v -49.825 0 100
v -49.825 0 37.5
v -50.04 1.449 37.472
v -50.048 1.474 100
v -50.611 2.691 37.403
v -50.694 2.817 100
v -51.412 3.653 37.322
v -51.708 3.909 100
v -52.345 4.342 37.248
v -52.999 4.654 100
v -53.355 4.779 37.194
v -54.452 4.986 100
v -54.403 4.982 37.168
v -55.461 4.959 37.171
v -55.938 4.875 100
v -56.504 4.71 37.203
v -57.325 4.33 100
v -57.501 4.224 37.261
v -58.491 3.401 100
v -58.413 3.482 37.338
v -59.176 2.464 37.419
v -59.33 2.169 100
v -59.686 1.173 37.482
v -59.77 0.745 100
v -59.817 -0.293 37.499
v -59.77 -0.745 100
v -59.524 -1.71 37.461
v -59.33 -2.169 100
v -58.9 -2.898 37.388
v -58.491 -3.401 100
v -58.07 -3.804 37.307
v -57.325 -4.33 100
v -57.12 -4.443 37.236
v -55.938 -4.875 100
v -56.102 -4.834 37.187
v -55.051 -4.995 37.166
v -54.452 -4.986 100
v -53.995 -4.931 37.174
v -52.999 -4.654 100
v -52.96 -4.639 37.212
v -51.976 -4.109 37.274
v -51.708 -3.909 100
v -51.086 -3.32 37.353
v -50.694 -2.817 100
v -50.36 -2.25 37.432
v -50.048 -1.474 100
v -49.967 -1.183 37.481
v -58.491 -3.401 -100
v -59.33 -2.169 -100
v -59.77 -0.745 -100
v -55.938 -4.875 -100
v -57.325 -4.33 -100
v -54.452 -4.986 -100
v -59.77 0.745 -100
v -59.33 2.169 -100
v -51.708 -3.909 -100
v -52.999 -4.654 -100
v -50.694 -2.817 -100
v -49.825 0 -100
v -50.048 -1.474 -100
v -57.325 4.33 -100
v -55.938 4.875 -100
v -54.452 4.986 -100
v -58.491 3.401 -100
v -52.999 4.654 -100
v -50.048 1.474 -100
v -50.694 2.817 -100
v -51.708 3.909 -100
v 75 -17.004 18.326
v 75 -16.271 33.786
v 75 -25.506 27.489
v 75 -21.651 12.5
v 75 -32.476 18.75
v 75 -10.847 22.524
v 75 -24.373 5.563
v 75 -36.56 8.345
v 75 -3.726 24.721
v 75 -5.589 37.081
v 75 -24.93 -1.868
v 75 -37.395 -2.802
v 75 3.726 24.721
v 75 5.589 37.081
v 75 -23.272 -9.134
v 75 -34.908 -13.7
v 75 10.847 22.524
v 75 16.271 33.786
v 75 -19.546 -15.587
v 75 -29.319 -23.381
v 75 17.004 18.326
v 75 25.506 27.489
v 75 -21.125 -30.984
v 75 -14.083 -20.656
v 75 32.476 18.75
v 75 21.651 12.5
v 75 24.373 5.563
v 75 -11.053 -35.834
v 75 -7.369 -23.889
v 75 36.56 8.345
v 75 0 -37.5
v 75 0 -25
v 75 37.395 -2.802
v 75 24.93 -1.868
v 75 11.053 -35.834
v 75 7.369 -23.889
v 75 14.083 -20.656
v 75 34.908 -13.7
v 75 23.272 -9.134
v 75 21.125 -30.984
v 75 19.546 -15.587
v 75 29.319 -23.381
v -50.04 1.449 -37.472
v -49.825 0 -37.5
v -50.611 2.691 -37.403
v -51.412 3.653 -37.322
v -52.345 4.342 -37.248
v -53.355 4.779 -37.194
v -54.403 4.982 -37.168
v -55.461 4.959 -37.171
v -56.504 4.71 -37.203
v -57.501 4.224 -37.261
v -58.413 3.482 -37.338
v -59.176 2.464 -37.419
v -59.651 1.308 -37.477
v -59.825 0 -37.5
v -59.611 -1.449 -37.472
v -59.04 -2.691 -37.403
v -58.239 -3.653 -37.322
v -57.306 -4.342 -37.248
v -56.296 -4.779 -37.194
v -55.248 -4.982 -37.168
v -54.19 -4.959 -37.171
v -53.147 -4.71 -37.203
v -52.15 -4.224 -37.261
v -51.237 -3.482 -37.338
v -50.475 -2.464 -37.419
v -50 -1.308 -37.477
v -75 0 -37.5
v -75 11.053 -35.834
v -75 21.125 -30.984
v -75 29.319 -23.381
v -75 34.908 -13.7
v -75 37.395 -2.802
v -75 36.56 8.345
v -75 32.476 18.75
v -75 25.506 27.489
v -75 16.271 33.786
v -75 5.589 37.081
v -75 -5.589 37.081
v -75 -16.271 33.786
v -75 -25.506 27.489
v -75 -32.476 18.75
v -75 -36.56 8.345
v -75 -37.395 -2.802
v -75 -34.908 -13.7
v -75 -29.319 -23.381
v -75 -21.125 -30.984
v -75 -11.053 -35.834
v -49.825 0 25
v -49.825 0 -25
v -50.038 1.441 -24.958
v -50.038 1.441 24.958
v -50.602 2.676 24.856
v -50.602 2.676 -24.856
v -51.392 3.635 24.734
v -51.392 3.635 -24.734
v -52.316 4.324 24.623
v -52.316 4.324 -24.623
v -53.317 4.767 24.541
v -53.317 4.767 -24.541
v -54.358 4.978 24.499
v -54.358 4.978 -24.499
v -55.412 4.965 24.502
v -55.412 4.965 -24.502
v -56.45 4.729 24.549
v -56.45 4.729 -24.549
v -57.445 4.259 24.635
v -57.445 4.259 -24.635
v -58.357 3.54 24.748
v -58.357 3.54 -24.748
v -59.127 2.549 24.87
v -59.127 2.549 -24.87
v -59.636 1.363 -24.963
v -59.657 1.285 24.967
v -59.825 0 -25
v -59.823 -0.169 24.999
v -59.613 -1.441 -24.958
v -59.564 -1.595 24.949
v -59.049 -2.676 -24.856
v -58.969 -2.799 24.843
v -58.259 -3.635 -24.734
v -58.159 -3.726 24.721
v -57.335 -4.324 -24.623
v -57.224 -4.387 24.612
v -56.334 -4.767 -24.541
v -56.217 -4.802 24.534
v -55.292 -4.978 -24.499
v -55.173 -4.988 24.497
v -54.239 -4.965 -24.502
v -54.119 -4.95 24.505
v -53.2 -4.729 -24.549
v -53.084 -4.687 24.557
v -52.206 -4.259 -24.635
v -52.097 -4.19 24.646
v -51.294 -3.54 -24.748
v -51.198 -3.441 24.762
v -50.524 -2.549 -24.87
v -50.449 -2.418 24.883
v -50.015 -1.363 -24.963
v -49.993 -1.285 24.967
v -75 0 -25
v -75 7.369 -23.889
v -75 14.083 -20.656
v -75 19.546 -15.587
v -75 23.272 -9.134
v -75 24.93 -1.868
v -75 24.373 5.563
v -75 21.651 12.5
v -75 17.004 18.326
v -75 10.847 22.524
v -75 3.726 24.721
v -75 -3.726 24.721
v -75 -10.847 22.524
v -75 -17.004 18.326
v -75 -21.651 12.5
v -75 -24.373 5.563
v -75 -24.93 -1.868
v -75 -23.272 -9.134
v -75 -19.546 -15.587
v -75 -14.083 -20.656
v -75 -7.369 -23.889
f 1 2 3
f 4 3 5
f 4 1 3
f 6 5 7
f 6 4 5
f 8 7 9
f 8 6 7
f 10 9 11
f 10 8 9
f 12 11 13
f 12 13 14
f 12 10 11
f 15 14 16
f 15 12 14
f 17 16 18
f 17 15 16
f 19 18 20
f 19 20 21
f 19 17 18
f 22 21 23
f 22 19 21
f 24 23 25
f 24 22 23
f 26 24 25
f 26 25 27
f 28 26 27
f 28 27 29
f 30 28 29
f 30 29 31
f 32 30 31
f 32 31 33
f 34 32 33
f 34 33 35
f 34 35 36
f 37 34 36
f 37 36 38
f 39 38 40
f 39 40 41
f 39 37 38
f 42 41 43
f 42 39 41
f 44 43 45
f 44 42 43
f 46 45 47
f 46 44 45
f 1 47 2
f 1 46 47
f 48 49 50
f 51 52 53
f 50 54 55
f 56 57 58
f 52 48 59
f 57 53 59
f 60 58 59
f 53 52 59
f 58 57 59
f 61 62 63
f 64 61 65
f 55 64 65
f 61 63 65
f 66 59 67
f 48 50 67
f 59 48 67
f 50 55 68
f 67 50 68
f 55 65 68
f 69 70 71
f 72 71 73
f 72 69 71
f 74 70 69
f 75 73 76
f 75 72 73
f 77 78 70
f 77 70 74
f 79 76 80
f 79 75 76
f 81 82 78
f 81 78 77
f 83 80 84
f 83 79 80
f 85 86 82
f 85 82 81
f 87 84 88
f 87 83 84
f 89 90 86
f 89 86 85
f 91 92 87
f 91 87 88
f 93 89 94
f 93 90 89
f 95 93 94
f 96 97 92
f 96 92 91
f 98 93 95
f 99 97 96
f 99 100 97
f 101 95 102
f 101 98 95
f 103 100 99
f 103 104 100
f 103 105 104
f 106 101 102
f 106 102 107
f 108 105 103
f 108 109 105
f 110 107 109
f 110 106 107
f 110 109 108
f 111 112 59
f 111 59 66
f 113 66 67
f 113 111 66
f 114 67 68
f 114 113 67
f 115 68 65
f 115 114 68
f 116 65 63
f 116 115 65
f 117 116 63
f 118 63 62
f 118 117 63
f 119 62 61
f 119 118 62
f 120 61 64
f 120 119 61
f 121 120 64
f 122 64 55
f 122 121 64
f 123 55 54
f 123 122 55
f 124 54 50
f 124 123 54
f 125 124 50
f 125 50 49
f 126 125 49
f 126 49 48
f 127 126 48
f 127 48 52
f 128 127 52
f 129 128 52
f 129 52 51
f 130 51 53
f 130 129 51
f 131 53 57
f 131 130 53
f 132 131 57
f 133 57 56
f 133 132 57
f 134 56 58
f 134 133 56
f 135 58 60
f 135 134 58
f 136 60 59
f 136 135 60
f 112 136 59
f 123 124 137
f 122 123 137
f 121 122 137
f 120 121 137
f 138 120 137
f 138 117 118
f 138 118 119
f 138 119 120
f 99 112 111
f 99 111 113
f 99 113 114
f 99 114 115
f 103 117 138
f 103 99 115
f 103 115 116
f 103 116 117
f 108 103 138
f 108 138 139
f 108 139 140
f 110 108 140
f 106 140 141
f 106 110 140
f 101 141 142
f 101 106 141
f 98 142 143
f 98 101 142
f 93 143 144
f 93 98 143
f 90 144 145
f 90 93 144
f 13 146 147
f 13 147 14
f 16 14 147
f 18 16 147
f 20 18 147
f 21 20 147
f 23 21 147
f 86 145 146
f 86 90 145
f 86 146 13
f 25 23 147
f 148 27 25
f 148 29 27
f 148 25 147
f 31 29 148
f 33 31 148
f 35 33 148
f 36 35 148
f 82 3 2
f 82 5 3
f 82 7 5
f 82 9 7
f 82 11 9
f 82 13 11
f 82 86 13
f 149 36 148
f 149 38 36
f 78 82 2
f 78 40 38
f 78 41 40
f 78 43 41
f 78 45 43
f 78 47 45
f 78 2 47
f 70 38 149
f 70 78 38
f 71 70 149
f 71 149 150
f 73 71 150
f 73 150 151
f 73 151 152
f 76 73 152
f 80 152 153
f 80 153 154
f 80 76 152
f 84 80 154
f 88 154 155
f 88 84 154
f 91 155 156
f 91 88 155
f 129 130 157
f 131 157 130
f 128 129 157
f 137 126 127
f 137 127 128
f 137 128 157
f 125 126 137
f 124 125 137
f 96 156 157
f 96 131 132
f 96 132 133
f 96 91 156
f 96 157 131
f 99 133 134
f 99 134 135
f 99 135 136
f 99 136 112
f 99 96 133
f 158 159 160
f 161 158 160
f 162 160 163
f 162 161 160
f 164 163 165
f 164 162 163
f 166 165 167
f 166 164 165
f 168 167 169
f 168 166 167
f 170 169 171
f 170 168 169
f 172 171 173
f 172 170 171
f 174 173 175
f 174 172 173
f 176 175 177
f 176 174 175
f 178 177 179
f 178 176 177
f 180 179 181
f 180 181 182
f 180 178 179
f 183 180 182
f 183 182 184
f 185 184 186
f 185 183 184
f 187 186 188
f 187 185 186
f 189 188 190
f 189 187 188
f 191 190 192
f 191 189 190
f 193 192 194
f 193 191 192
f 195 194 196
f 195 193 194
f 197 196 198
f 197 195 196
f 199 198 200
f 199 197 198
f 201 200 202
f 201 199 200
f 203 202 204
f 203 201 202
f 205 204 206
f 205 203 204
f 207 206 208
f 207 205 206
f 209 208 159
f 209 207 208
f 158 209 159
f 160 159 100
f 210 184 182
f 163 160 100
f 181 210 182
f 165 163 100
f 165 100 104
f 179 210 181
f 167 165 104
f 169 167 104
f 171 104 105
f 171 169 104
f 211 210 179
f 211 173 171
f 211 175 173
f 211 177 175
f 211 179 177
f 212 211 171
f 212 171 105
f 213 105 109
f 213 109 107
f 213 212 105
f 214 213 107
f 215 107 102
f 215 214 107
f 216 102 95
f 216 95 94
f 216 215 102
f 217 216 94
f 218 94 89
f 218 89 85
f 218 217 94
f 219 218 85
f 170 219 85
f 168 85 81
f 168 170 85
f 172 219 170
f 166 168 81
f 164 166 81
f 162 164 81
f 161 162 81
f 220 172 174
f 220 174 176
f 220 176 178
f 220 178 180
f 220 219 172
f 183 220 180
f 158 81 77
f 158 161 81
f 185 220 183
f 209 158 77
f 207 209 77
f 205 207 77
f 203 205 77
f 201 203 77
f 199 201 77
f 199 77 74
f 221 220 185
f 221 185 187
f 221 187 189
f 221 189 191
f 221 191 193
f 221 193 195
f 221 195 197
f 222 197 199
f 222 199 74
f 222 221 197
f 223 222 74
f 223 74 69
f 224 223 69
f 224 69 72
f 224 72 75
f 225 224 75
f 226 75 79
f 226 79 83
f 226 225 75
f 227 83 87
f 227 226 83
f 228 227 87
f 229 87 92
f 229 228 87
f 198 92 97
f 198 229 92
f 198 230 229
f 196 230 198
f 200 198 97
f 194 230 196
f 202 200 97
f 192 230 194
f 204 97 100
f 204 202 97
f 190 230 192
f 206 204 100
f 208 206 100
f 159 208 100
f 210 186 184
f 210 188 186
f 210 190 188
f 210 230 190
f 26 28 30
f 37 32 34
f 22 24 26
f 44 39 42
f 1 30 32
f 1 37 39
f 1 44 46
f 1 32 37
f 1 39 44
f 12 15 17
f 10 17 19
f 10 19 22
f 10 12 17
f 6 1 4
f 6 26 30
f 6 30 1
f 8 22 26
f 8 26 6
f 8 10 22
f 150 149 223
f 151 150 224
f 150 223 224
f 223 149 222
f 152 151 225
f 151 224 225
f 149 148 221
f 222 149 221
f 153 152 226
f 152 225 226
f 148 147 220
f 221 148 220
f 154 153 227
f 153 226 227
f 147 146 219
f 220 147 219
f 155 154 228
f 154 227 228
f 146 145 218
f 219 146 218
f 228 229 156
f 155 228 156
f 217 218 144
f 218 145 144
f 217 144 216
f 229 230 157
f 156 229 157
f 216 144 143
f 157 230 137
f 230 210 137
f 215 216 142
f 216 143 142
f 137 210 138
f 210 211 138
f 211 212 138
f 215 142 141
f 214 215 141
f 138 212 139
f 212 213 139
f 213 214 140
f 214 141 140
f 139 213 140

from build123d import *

# Parameters (mm, degrees)
SKETCH1_R           = 37.5
SKETCH1_R_2         = 25
BOSS_EXTRUDE1_DEPTH = 75
SKETCH2_R           = 5
BOSS_EXTRUDE2_DEPTH = 100


with BuildPart() as part:
    # Sketch1 → Boss-Extrude1 (new body, symmetric)
    with BuildSketch(Plane(origin=(0, 0, 0), x_dir=(0, 0, -1), z_dir=(1, 0, 0))):
        Circle(SKETCH1_R)
        Circle(SKETCH1_R_2, mode=Mode.SUBTRACT)
    extrude(amount=BOSS_EXTRUDE1_DEPTH, both=True)

    # Sketch2 → Boss-Extrude2 (add, symmetric)
    with BuildSketch(Plane.XY):
        with Locations((-54.825376389, 0)):
            Circle(SKETCH2_R)
    extrude(amount=BOSS_EXTRUDE2_DEPTH, both=True)


solid = part.part
